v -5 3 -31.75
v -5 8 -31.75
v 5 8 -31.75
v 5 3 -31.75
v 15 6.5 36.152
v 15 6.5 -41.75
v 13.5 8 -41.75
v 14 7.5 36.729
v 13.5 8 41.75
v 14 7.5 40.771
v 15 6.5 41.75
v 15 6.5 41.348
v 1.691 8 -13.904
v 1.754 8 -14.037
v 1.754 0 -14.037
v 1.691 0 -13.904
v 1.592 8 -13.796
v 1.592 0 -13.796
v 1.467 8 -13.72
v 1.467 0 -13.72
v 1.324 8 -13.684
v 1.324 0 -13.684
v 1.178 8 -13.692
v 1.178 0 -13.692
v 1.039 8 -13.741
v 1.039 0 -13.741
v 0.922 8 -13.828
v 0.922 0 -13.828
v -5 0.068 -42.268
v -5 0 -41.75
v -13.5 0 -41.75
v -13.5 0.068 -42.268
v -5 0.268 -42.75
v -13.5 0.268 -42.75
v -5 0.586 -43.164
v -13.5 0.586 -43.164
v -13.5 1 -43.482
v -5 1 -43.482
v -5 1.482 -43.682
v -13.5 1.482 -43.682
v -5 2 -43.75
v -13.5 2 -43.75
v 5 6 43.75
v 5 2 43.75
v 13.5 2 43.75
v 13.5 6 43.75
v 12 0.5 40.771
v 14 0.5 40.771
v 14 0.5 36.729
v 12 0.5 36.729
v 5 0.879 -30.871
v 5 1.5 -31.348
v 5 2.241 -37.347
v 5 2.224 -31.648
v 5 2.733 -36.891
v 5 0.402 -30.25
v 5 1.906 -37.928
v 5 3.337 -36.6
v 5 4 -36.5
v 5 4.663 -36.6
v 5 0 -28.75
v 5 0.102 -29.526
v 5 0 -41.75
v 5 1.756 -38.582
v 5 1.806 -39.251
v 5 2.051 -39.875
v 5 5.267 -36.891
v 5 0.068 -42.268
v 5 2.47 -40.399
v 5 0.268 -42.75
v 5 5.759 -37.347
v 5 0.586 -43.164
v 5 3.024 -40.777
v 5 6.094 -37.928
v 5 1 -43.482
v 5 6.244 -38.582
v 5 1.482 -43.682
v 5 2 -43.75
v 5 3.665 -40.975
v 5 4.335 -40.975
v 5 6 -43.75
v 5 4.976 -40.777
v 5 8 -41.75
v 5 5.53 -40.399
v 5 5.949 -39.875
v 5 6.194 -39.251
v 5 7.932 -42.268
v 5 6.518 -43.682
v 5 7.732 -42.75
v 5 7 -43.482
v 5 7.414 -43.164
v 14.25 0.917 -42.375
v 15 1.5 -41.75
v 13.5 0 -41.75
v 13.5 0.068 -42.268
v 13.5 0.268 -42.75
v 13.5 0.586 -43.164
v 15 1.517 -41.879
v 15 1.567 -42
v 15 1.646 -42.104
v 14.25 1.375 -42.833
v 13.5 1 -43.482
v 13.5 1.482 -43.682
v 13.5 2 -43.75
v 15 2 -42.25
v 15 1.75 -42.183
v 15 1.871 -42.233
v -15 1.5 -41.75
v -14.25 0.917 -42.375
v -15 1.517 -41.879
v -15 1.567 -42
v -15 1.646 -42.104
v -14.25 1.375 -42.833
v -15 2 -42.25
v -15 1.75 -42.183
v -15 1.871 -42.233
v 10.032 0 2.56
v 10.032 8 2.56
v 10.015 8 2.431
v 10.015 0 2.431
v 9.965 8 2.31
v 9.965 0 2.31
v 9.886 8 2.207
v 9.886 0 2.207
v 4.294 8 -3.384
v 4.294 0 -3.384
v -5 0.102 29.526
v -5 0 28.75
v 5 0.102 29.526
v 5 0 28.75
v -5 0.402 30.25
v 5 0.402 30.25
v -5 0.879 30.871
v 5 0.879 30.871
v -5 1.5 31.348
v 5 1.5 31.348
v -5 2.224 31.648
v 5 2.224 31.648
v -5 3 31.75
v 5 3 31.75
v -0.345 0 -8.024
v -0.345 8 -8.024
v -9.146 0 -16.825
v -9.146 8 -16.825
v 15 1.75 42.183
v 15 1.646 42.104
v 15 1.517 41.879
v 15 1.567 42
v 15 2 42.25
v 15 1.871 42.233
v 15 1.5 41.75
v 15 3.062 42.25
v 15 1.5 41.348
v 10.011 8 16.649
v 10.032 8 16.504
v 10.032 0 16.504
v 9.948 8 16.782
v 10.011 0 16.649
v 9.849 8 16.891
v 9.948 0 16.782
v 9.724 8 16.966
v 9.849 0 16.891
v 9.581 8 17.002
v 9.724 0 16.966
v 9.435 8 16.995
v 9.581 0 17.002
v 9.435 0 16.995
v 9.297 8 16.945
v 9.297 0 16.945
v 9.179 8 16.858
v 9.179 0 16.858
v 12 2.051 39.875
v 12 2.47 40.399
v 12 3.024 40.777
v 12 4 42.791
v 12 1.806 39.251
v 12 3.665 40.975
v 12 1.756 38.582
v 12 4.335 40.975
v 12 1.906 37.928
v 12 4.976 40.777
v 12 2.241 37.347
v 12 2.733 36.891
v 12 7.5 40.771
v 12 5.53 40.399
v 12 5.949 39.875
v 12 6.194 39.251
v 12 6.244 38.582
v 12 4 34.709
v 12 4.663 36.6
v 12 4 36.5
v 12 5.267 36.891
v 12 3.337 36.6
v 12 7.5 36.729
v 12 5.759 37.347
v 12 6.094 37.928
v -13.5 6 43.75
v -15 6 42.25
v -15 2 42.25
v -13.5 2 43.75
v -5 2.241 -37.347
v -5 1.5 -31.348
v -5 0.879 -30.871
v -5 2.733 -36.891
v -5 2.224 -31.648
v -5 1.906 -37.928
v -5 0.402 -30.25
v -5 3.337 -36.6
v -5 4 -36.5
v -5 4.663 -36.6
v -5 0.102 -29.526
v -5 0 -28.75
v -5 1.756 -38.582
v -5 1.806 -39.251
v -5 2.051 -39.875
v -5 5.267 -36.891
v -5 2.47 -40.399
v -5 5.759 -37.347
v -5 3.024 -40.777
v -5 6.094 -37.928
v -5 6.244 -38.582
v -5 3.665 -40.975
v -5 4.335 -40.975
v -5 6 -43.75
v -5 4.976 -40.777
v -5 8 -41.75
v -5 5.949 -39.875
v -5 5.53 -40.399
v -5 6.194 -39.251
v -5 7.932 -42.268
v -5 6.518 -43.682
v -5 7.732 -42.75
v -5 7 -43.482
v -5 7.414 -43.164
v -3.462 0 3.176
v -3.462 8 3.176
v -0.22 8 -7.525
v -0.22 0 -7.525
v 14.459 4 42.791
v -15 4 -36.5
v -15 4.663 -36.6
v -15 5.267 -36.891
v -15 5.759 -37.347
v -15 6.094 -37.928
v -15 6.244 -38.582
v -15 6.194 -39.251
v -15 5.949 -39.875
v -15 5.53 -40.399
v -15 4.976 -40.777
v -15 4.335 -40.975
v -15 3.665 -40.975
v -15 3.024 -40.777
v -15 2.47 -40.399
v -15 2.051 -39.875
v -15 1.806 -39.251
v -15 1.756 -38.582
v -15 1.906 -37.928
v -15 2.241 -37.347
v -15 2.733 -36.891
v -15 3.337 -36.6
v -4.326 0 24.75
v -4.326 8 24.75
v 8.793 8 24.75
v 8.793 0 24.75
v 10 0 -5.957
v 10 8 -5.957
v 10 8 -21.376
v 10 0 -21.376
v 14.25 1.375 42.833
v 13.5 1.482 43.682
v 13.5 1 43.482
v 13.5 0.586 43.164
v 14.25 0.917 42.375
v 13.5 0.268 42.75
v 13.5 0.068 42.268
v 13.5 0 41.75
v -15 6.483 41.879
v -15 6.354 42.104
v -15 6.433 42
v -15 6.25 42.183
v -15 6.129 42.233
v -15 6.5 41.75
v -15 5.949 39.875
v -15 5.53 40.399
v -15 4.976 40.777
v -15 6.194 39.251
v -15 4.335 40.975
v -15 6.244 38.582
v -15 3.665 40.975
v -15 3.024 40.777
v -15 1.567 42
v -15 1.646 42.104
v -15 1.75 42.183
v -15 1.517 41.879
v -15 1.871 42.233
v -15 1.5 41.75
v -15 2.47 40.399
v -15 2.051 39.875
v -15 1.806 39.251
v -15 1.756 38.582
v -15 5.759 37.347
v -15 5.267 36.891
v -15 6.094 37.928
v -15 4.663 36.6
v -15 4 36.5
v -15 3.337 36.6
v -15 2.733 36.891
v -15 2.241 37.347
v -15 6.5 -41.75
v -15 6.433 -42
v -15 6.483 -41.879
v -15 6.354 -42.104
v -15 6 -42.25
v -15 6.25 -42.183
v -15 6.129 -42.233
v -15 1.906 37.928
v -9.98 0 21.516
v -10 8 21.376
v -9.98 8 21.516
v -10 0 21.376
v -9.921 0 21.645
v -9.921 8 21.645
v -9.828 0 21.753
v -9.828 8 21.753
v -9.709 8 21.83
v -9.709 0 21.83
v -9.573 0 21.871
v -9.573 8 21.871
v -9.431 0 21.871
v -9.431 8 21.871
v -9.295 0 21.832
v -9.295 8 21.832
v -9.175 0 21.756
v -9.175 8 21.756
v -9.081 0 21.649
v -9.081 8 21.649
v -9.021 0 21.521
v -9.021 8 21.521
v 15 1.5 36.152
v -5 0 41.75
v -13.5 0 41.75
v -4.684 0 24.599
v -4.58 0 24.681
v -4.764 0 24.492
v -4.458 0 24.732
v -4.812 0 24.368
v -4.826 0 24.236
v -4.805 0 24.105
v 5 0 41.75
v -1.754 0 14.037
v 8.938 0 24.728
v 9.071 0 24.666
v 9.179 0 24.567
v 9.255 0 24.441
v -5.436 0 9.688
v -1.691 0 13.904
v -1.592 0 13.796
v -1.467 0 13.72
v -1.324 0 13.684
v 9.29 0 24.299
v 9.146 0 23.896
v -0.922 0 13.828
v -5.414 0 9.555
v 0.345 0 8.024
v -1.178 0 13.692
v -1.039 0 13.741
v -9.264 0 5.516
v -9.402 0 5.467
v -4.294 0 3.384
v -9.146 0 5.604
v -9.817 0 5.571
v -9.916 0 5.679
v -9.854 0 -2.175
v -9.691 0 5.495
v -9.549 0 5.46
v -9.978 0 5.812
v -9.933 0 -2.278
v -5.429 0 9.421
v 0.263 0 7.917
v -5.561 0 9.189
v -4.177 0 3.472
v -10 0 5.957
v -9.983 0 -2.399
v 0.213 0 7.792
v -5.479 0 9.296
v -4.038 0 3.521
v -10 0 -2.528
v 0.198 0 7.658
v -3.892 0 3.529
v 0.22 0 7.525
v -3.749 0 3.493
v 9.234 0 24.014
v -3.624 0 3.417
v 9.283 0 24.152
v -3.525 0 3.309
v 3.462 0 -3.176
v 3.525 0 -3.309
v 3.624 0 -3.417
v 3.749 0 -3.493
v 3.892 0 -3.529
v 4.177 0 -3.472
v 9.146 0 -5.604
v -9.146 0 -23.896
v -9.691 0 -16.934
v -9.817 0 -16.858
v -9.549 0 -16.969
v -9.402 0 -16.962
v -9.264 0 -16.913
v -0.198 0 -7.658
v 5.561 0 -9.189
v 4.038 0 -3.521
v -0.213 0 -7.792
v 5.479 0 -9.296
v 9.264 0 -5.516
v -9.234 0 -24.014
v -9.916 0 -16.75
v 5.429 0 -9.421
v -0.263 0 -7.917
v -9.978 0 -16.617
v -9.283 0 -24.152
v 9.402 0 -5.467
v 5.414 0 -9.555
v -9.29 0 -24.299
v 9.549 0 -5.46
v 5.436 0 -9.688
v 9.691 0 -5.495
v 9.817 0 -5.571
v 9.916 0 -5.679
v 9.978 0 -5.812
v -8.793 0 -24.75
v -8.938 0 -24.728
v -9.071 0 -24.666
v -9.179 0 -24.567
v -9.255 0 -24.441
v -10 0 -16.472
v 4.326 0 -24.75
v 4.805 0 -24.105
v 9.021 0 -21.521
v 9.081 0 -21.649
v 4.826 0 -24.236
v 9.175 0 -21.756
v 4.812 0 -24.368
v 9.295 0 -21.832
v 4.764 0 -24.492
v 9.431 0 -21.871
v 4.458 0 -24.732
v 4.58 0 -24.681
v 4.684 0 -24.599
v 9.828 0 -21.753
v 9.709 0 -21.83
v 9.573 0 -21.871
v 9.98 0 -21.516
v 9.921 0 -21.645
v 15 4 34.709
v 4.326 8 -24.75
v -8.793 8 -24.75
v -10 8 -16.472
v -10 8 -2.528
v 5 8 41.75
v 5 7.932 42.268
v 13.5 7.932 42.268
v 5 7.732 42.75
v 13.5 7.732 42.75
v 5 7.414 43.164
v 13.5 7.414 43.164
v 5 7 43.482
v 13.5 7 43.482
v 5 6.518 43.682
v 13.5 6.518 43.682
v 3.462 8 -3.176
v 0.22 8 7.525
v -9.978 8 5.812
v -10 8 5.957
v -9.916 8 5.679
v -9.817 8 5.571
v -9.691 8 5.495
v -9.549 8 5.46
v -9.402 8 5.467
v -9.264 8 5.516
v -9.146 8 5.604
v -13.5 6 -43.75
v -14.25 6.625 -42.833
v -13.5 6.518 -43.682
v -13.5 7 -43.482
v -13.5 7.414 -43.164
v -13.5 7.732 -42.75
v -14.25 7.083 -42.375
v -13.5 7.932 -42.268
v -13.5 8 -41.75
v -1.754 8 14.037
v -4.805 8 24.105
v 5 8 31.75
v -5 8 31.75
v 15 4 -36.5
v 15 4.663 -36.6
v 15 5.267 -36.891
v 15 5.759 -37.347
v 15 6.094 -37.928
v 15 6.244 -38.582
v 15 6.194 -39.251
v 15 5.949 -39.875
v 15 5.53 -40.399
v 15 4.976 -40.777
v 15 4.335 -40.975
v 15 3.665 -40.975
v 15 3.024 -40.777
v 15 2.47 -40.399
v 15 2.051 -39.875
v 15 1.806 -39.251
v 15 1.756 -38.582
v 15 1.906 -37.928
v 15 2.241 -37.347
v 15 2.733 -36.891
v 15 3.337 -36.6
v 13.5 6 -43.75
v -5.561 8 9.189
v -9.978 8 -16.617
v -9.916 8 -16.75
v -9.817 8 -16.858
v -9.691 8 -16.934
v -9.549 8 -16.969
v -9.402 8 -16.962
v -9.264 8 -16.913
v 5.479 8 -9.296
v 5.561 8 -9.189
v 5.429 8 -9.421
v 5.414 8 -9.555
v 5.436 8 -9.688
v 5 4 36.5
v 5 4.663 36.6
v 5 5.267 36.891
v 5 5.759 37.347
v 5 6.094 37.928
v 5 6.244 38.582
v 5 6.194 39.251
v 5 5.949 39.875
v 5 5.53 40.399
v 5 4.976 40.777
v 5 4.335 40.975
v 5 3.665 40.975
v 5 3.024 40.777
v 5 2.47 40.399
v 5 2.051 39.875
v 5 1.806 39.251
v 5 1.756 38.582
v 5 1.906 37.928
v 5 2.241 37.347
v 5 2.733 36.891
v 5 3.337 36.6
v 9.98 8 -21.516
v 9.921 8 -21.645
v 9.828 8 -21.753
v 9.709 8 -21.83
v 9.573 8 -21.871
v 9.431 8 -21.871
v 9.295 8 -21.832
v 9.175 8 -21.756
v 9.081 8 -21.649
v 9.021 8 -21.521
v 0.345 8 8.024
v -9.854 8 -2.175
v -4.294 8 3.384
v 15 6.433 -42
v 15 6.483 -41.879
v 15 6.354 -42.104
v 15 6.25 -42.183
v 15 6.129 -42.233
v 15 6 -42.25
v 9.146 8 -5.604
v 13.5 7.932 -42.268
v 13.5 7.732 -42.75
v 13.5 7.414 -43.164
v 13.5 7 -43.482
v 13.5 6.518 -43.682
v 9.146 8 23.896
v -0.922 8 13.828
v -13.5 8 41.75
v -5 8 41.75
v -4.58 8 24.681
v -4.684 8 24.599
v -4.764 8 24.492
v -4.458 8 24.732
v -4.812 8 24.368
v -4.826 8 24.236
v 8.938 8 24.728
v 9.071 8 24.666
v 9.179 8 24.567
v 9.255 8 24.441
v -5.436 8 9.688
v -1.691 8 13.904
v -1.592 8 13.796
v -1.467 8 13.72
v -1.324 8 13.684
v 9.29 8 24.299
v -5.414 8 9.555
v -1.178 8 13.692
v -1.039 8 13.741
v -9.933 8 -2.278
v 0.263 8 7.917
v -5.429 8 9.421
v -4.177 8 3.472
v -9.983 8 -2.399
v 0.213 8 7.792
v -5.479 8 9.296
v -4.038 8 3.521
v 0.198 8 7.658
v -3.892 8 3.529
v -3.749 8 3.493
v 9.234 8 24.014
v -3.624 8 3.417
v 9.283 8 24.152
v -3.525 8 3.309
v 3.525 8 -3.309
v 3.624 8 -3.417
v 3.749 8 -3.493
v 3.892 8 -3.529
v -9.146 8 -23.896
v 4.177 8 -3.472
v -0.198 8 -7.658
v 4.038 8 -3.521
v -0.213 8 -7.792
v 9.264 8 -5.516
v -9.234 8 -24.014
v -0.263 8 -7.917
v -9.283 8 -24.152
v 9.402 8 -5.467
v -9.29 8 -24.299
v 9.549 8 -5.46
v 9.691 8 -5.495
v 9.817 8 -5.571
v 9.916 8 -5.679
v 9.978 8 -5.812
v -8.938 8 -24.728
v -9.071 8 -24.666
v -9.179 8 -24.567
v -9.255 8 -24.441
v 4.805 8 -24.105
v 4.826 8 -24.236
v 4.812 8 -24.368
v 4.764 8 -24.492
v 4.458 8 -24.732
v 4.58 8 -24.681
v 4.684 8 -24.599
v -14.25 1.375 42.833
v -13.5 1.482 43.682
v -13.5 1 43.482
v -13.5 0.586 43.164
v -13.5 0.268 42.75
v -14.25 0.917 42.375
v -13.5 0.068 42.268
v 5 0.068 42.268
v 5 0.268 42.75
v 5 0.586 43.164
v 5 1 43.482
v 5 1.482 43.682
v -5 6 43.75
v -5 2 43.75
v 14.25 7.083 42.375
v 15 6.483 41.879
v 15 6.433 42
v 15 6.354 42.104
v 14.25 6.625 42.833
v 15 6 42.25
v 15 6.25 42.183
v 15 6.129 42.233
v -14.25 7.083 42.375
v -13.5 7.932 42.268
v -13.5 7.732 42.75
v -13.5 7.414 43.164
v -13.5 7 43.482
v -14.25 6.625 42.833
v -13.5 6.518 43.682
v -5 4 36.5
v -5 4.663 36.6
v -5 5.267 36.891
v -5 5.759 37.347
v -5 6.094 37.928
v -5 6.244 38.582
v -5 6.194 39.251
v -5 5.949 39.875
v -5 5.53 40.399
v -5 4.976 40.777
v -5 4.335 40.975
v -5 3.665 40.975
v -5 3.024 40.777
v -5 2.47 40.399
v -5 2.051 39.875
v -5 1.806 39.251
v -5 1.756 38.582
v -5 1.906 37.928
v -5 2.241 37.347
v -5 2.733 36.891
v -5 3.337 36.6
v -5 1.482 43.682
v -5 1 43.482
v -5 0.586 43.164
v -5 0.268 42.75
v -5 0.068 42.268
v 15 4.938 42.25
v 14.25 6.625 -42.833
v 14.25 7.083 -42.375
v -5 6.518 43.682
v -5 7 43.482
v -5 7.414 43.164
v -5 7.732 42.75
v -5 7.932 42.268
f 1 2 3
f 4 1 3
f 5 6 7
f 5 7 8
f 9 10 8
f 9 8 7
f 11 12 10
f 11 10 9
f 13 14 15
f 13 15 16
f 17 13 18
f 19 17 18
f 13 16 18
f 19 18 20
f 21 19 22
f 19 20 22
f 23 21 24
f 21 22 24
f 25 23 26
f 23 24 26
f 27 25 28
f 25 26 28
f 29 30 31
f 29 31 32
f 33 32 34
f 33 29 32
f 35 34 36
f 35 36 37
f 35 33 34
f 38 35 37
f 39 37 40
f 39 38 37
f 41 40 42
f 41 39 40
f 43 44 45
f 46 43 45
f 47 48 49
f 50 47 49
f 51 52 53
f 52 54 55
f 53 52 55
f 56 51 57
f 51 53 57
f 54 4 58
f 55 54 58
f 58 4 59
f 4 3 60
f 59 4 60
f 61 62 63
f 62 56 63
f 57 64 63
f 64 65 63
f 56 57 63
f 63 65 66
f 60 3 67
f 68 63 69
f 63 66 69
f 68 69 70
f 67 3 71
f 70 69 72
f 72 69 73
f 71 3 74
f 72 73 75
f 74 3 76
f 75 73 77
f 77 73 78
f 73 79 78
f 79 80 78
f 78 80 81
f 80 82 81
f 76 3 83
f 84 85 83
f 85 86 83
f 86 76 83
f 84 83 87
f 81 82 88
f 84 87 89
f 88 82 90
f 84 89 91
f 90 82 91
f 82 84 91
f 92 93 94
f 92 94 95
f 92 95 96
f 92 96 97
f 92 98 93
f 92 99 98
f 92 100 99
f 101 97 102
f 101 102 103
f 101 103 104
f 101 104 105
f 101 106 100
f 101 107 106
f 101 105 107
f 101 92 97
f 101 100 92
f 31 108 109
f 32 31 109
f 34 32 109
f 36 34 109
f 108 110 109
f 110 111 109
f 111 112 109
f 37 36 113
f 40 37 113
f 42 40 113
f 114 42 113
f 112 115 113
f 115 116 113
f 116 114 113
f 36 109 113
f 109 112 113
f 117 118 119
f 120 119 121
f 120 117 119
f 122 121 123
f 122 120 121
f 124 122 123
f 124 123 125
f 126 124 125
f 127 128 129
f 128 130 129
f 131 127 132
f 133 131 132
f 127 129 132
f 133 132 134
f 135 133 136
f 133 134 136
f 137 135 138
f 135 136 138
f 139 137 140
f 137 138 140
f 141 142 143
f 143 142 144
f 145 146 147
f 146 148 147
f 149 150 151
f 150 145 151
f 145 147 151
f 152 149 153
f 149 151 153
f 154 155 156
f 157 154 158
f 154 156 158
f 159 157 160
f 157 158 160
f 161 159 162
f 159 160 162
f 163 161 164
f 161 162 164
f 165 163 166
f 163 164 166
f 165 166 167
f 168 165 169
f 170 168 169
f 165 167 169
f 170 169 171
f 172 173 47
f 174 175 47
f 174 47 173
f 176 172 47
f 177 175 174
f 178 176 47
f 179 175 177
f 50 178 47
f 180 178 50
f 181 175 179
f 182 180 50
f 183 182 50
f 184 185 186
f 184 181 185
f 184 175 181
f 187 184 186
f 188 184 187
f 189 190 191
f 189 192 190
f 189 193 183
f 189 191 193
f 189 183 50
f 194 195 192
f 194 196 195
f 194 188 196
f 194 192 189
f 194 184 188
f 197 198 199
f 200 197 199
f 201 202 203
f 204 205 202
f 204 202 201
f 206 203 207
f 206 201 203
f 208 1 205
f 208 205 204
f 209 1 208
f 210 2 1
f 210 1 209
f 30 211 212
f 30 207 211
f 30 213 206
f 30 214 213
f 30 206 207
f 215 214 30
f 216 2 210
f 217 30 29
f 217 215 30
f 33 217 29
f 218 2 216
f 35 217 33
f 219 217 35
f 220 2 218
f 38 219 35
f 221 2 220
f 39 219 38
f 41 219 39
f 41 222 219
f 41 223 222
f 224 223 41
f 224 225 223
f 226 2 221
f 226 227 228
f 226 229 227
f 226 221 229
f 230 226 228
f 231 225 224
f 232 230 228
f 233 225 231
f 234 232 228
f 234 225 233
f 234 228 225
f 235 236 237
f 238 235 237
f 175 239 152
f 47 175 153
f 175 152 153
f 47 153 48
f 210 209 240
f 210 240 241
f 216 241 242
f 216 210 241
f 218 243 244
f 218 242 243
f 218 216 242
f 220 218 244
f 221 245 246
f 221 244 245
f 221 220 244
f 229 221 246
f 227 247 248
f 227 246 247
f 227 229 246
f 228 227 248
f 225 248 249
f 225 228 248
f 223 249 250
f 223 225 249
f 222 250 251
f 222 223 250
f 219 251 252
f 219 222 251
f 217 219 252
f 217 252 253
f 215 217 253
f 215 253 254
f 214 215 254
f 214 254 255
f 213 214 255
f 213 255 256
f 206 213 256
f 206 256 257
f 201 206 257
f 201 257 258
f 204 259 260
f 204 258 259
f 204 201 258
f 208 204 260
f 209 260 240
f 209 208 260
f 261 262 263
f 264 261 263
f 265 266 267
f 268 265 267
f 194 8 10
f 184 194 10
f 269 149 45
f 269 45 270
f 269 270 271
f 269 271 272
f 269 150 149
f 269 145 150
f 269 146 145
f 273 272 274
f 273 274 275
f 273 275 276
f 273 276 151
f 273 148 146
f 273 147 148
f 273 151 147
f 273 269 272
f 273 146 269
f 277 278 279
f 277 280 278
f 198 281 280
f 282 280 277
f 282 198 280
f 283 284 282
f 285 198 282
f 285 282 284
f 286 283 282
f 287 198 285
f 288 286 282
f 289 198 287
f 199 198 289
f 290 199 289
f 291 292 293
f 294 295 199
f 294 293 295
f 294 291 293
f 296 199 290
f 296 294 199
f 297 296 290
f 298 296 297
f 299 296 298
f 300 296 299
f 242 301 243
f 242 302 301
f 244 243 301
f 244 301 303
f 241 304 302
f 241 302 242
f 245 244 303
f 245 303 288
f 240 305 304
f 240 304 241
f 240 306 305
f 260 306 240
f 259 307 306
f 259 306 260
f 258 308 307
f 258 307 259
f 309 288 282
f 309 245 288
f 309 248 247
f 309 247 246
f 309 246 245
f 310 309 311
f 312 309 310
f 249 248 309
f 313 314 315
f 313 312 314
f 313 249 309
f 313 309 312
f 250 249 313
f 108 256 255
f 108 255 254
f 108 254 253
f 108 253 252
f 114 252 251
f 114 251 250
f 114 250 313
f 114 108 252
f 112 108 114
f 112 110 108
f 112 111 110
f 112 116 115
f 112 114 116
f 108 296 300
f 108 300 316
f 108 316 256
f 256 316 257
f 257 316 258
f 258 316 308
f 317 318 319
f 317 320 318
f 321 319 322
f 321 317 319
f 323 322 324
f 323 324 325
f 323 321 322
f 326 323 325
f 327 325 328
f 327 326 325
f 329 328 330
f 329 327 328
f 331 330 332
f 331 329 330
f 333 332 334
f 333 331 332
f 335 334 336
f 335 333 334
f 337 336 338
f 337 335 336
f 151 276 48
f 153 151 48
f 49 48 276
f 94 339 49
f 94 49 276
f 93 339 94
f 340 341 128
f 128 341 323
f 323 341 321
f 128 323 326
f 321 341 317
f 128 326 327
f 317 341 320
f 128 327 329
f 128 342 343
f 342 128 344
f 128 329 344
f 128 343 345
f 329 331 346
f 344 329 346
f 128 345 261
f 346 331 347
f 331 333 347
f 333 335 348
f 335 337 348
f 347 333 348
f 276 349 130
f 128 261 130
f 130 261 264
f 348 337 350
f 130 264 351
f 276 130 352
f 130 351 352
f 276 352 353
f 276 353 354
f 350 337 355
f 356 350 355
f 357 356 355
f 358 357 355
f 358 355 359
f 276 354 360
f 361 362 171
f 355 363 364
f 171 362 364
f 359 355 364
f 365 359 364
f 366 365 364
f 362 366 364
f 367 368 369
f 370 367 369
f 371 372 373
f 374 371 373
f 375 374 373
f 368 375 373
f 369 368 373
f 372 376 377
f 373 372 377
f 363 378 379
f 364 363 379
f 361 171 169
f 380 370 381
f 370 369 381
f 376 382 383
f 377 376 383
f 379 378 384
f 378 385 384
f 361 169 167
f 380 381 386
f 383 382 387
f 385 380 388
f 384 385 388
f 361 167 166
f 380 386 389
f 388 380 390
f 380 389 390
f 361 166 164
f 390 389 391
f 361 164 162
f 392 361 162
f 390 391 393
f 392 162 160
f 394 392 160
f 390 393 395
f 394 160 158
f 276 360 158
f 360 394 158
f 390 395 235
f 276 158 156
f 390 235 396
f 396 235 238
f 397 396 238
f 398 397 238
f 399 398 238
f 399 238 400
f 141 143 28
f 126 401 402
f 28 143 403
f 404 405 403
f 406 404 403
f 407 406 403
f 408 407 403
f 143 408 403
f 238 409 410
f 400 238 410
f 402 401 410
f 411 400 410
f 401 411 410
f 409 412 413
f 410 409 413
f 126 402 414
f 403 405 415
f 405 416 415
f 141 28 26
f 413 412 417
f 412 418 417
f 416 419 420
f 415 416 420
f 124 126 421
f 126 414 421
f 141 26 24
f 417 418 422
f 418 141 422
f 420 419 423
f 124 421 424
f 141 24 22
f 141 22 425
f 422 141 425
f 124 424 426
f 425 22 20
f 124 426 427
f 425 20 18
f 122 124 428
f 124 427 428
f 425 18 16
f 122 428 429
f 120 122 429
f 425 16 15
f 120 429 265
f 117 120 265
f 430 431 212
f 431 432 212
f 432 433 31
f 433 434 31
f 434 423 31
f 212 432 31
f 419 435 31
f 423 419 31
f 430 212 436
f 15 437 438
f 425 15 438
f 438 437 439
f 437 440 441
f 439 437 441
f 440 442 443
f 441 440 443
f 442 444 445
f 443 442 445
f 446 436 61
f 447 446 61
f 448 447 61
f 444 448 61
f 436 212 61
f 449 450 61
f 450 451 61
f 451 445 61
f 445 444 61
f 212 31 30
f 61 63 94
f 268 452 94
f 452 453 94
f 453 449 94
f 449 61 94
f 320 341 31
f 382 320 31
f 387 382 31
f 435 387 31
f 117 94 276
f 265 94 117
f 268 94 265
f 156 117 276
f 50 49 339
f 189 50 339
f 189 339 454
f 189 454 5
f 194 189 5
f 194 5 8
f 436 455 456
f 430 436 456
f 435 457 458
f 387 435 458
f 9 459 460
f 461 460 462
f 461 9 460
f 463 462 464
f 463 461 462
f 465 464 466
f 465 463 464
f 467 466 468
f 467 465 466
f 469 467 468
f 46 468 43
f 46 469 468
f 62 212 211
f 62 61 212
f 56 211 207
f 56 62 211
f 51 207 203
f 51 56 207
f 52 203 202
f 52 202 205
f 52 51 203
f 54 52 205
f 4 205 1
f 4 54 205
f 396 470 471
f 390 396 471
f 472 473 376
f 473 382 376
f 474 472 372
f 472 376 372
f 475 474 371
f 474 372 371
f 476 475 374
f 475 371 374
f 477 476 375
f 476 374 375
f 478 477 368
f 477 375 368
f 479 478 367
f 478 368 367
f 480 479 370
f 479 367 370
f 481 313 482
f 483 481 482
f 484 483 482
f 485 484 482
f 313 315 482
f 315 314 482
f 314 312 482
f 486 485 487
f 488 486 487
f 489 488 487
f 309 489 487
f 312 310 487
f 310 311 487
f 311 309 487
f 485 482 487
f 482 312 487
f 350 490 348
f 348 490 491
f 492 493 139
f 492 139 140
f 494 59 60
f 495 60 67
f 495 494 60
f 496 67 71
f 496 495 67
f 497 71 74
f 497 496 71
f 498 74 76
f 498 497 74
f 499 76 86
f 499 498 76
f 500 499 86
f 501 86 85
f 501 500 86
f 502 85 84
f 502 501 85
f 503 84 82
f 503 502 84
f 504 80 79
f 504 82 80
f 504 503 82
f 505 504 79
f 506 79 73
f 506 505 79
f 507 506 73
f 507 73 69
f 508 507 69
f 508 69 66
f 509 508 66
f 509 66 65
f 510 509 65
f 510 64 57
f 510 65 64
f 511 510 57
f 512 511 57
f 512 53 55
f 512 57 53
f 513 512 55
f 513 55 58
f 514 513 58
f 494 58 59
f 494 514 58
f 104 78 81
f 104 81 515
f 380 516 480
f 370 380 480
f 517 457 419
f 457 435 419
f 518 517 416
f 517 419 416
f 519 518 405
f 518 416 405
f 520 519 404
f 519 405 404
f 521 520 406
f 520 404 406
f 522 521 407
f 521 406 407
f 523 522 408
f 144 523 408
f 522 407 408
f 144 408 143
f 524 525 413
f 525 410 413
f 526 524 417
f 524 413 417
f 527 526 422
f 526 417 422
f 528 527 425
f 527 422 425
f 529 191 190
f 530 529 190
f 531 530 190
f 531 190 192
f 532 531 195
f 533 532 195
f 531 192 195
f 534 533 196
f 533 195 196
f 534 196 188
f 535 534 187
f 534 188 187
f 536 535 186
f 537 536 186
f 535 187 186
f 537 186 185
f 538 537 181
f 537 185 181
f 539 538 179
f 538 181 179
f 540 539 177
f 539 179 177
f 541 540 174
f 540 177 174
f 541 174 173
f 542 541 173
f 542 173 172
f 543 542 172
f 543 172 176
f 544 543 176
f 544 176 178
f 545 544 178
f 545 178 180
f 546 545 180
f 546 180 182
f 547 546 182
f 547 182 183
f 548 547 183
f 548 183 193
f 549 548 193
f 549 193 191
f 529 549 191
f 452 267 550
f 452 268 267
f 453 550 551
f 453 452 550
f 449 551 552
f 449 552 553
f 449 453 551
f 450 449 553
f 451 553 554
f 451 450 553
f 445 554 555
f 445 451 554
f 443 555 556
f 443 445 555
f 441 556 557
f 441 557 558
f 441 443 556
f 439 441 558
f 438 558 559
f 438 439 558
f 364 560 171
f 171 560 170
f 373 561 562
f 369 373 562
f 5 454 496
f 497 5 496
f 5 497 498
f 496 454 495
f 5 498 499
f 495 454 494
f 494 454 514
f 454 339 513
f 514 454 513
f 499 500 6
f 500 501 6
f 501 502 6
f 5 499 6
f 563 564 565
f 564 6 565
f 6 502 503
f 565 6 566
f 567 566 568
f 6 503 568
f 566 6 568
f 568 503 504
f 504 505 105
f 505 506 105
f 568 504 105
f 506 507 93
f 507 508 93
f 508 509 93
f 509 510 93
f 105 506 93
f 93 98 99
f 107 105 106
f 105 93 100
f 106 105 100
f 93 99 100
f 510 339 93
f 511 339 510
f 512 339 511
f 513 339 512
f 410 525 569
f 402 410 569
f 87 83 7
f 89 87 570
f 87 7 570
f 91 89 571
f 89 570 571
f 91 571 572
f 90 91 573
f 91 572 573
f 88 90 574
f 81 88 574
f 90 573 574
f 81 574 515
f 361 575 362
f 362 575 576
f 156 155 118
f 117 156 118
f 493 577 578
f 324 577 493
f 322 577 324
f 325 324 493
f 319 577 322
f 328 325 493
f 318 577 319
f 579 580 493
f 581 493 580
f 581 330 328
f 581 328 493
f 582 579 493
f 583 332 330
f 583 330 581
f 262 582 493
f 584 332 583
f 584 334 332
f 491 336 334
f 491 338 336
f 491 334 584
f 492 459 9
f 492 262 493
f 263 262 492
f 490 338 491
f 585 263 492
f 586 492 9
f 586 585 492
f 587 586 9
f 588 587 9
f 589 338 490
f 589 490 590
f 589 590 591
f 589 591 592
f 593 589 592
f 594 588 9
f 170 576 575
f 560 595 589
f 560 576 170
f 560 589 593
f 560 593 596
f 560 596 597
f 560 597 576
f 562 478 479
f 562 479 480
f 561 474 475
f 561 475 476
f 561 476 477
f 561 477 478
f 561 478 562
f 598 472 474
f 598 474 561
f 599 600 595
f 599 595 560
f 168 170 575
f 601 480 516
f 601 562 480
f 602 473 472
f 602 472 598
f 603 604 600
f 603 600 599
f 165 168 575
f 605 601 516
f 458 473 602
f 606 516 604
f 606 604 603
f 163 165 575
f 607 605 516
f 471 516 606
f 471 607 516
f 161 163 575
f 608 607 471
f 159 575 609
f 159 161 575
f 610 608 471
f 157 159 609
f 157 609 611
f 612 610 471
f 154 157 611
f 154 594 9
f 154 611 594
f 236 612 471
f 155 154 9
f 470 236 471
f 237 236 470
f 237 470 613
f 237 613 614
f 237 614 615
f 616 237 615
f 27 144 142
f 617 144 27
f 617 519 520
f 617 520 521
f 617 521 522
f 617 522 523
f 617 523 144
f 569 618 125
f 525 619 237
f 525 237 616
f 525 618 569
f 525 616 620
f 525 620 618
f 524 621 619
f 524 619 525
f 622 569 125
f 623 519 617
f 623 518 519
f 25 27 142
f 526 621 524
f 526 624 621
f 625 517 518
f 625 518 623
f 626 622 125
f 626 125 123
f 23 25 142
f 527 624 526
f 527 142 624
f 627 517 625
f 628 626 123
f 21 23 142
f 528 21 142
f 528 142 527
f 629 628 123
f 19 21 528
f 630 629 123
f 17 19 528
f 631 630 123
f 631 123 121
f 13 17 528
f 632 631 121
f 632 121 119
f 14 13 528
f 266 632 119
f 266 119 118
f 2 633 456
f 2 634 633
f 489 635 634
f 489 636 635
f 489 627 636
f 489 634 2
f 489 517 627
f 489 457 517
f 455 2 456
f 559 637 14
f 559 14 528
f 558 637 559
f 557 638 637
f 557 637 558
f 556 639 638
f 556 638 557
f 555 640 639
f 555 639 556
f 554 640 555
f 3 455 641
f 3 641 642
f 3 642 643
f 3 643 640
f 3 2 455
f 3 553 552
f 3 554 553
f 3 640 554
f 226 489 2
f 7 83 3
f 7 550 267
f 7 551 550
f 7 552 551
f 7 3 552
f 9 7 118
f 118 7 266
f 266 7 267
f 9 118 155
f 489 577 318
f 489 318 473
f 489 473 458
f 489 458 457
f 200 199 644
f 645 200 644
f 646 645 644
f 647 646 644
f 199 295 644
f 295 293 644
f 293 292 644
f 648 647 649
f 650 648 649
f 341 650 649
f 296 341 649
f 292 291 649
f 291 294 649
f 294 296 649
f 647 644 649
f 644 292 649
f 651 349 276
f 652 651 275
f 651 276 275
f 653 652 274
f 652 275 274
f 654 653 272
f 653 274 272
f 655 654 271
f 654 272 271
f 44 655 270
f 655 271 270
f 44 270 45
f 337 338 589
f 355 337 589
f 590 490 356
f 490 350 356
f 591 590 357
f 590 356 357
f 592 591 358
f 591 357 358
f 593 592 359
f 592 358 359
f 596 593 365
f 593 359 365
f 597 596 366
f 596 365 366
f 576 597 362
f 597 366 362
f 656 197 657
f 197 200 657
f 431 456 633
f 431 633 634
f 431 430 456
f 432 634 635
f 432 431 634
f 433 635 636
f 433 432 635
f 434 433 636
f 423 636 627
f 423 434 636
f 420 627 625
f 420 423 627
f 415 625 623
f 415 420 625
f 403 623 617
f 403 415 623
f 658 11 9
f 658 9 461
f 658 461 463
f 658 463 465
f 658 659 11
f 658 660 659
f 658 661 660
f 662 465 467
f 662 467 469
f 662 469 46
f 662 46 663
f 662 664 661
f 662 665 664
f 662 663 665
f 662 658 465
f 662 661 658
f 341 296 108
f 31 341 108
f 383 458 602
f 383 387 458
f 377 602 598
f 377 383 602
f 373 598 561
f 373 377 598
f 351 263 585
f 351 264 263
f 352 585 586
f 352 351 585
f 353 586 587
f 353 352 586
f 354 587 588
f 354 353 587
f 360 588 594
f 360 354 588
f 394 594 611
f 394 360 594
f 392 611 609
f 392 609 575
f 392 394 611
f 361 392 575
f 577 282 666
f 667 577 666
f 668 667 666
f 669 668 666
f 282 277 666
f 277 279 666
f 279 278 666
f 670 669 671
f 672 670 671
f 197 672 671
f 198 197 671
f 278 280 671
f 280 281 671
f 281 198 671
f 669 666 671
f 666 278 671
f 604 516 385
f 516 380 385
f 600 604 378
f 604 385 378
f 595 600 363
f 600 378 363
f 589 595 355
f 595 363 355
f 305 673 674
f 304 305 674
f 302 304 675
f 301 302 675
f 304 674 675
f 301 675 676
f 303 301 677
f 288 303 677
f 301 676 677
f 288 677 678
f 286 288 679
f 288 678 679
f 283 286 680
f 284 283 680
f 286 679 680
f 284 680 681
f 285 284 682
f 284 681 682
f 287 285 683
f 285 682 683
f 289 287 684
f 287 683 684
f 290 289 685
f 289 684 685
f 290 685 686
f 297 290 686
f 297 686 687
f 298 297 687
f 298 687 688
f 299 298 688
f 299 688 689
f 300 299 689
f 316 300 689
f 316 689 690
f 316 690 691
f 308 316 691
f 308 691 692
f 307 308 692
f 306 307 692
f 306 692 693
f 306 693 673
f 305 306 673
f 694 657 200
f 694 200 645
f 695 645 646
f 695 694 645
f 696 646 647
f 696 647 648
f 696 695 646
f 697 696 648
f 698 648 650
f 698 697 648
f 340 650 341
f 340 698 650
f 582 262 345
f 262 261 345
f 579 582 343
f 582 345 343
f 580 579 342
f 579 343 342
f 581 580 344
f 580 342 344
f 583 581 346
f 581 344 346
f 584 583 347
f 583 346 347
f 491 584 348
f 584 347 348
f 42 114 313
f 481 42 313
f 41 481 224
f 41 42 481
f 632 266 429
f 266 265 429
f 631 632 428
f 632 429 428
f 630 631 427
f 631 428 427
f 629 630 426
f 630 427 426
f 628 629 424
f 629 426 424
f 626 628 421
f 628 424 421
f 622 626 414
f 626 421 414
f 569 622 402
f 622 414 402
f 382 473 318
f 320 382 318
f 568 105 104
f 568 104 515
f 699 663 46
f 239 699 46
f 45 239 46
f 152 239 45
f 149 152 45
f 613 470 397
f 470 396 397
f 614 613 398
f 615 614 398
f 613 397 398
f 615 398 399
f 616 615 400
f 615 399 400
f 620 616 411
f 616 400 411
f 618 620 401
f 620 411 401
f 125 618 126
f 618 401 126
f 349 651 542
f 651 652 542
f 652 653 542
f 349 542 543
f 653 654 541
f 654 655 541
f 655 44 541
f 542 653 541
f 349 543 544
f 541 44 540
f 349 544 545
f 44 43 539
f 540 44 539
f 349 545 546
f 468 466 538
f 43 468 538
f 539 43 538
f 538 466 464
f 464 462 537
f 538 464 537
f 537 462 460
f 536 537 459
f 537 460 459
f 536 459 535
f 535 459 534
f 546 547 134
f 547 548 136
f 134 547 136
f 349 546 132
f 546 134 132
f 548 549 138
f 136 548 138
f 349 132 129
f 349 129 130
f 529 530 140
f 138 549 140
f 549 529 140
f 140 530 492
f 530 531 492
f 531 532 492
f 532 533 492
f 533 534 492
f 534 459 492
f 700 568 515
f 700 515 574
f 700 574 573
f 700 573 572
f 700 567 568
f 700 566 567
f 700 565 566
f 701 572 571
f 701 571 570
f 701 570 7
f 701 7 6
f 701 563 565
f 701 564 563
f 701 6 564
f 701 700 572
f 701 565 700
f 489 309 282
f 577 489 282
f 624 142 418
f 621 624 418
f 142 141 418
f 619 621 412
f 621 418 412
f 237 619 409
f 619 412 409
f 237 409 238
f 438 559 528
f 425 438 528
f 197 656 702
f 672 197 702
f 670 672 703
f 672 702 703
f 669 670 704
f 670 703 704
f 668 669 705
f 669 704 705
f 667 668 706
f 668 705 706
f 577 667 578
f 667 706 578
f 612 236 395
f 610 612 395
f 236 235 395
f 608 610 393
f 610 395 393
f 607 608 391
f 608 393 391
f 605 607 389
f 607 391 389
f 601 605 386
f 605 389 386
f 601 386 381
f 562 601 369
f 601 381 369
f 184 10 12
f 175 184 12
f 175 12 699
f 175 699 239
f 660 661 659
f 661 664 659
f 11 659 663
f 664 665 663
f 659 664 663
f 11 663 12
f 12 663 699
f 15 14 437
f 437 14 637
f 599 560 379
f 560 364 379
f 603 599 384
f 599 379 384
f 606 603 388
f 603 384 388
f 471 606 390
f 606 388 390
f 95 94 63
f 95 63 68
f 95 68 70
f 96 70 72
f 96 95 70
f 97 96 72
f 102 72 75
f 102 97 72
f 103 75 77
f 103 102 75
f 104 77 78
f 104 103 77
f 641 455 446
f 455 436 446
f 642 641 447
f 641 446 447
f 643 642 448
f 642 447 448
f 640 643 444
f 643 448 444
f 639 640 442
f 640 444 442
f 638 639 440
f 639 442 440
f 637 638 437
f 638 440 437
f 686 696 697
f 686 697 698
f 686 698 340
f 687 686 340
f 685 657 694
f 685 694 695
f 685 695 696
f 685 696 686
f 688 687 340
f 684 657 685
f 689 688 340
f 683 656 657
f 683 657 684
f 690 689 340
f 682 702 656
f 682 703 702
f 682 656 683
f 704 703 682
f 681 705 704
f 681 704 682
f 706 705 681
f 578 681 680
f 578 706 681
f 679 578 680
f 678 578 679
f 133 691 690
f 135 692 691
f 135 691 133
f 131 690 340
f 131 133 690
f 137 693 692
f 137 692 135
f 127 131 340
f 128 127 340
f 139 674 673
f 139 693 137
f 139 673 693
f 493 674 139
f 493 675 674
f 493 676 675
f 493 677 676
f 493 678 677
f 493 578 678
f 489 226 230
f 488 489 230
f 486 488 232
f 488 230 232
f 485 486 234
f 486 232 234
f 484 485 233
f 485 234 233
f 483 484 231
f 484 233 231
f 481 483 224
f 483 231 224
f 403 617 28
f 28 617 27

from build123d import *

# Parameters (mm, degrees)
SKETCH1_W           = 30
SKETCH1_H           = 87.5
BOSS_EXTRUDE1_DEPTH = 8
SKETCH2_W           = 10
SKETCH2_H           = 12
CUT_EXTRUDE1_DEPTH  = 8
SKETCH3_R           = 2.25
CUT_EXTRUDE2_DEPTH  = 54.647576833
FILLET1_R           = 2
CUT_EXTRUDE3_DEPTH  = 47.936792605
FILLET2_R           = 3
CHAMFER1_SIZE       = 1.5
FILLET3_R           = 0.5
CUT_EXTRUDE4_DEPTH  = 3


with BuildPart() as part:
    # Sketch1 → Boss-Extrude1 (new body)
    with BuildSketch(Plane(origin=(0, 0, 0), x_dir=(1, 0, 0), z_dir=(0, 1, 0))):
        Rectangle(SKETCH1_W, SKETCH1_H)
    extrude(amount=BOSS_EXTRUDE1_DEPTH)

    # Sketch2 → Cut-Extrude1 (cut)
    with BuildSketch(Plane(origin=(0, 8, 0), x_dir=(1, 0, 0), z_dir=(0, 1, 0))):
        with Locations((0, 37.75)):
            Rectangle(SKETCH2_W, SKETCH2_H)
        with Locations((0, -37.75)):
            Rectangle(SKETCH2_W, SKETCH2_H)
    extrude(amount=-CUT_EXTRUDE1_DEPTH, mode=Mode.SUBTRACT)

    # Sketch3 → Cut-Extrude2 (cut, through all)
    with BuildSketch(Plane(origin=(15, 0, 0), x_dir=(0, 0, -1), z_dir=(1, 0, 0))):
        with Locations((-38.75, 4)):
            Circle(SKETCH3_R)
    cut_extrude2 = extrude(amount=-CUT_EXTRUDE2_DEPTH, mode=Mode.SUBTRACT)

    # Mirror1: Cut-Extrude2 across plane
    add(cut_extrude2.mirror(Plane.XY), mode=Mode.SUBTRACT)

    # Fillet1
    fillet1_edges = [part.edges().sort_by_distance(p)[0] for p in [
        (10, 0, 43.75),
        (-10, 0, -43.75),
        (-10, 8, 43.75),
        (-10, 8, -43.75),
        (10, 8, 43.75),
        (-10, 0, 43.75),
        (10, 0, -43.75),
        (10, 8, -43.75),
    ]]
    fillet(fillet1_edges, radius=FILLET1_R)

    # Sketch4 → Cut-Extrude3 (cut, through all)
    with BuildSketch(Plane(origin=(0, 8, 0), x_dir=(1, 0, 0), z_dir=(0, 1, 0))):
        Polygon((5, 24.75), (-10, 24.75), (1.511627907, 13.238372093), align=None)
        Polygon((10, 4.75), (10, 24.75), (5.348837209, 9.401162791), align=None)
        Polygon((-10, -4.75), (-10, -24.75), (-5.348837209, -9.401162791), align=None)
        Polygon((-5, -24.75), (10, -24.75), (-1.511627907, -13.238372093), align=None)
        Polygon((-10, 17.678932188), (-10, 2.321067812), (-3.704402834, -3.974529354), (-0.132806468, 7.811738656), align=None)
        Polygon((10.032301404, -17.711233593), (10.032301404, -2.353369216), (3.704402834, 3.974529354), (0.132806468, -7.811738656), align=None)
    extrude(amount=-CUT_EXTRUDE3_DEPTH, mode=Mode.SUBTRACT)

    # Fillet2
    fillet2_edges = [part.edges().sort_by_distance(p)[0] for p in [
        (0, 0, -31.75),
        (0, 0, 31.75),
    ]]
    fillet(fillet2_edges, radius=FILLET2_R)

    # Chamfer1
    chamfer1_edges = [part.edges().sort_by_distance(p)[0] for p in [
        (15, 4, -43.75),
        (15, 0, 0),
        (-15, 0, 0),
        (15, 8, 0),
        (15, 4, 43.75),
        (15, 7.414213562, 43.164213562),
        (15, 0.585786438, 43.164213562),
        (15, 7.414213562, -43.164213562),
        (15, 0.585786438, -43.164213562),
        (-15, 8, 0),
        (-15, 4, 43.75),
        (-15, 4, -43.75),
        (-15, 0.585786438, 43.164213562),
        (-15, 7.414213562, 43.164213562),
        (-15, 0.585786438, -43.164213562),
        (-15, 7.414213562, -43.164213562),
    ]]
    chamfer(chamfer1_edges, length=CHAMFER1_SIZE)

    # Fillet3
    fillet3_edges = [part.edges().sort_by_distance(p)[0] for p in [
        (-10, 4, -17.678932188),
        (-0.132806468, 4, -7.811738656),
        (-3.704402834, 4, 3.974529354),
        (-10, 4, -2.321067812),
        (-1.511627907, 4, 13.238372093),
        (10, 4, 24.75),
        (-5, 4, 24.75),
        (10, 4, -4.75),
        (5.348837209, 4, -9.401162791),
        (10, 4, -24.75),
        (-10, 4, 4.75),
        (-5.348837209, 4, 9.401162791),
        (-10, 4, 24.75),
        (10.032301404, 4, 17.711233593),
        (0.132806468, 4, 7.811738656),
        (3.704402834, 4, -3.974529354),
        (10.032301404, 4, 2.353369216),
        (5, 4, -24.75),
        (1.511627907, 4, -13.238372093),
        (-10, 4, -24.75),
    ]]
    fillet(fillet3_edges, radius=FILLET3_R)

    # Sketch5 → Cut-Extrude4 (cut)
    with BuildSketch(Plane(origin=(15, 0, 0), x_dir=(0, 0, -1), z_dir=(1, 0, 0))):
        Polygon((-34.708548116, 4), (-36.729274058, 7.5), (-40.770725942, 7.5), (-42.791451884, 4), (-40.770725942, 0.5), (-36.729274058, 0.5), align=None)
    extrude(amount=-CUT_EXTRUDE4_DEPTH, mode=Mode.SUBTRACT)


solid = part.part
